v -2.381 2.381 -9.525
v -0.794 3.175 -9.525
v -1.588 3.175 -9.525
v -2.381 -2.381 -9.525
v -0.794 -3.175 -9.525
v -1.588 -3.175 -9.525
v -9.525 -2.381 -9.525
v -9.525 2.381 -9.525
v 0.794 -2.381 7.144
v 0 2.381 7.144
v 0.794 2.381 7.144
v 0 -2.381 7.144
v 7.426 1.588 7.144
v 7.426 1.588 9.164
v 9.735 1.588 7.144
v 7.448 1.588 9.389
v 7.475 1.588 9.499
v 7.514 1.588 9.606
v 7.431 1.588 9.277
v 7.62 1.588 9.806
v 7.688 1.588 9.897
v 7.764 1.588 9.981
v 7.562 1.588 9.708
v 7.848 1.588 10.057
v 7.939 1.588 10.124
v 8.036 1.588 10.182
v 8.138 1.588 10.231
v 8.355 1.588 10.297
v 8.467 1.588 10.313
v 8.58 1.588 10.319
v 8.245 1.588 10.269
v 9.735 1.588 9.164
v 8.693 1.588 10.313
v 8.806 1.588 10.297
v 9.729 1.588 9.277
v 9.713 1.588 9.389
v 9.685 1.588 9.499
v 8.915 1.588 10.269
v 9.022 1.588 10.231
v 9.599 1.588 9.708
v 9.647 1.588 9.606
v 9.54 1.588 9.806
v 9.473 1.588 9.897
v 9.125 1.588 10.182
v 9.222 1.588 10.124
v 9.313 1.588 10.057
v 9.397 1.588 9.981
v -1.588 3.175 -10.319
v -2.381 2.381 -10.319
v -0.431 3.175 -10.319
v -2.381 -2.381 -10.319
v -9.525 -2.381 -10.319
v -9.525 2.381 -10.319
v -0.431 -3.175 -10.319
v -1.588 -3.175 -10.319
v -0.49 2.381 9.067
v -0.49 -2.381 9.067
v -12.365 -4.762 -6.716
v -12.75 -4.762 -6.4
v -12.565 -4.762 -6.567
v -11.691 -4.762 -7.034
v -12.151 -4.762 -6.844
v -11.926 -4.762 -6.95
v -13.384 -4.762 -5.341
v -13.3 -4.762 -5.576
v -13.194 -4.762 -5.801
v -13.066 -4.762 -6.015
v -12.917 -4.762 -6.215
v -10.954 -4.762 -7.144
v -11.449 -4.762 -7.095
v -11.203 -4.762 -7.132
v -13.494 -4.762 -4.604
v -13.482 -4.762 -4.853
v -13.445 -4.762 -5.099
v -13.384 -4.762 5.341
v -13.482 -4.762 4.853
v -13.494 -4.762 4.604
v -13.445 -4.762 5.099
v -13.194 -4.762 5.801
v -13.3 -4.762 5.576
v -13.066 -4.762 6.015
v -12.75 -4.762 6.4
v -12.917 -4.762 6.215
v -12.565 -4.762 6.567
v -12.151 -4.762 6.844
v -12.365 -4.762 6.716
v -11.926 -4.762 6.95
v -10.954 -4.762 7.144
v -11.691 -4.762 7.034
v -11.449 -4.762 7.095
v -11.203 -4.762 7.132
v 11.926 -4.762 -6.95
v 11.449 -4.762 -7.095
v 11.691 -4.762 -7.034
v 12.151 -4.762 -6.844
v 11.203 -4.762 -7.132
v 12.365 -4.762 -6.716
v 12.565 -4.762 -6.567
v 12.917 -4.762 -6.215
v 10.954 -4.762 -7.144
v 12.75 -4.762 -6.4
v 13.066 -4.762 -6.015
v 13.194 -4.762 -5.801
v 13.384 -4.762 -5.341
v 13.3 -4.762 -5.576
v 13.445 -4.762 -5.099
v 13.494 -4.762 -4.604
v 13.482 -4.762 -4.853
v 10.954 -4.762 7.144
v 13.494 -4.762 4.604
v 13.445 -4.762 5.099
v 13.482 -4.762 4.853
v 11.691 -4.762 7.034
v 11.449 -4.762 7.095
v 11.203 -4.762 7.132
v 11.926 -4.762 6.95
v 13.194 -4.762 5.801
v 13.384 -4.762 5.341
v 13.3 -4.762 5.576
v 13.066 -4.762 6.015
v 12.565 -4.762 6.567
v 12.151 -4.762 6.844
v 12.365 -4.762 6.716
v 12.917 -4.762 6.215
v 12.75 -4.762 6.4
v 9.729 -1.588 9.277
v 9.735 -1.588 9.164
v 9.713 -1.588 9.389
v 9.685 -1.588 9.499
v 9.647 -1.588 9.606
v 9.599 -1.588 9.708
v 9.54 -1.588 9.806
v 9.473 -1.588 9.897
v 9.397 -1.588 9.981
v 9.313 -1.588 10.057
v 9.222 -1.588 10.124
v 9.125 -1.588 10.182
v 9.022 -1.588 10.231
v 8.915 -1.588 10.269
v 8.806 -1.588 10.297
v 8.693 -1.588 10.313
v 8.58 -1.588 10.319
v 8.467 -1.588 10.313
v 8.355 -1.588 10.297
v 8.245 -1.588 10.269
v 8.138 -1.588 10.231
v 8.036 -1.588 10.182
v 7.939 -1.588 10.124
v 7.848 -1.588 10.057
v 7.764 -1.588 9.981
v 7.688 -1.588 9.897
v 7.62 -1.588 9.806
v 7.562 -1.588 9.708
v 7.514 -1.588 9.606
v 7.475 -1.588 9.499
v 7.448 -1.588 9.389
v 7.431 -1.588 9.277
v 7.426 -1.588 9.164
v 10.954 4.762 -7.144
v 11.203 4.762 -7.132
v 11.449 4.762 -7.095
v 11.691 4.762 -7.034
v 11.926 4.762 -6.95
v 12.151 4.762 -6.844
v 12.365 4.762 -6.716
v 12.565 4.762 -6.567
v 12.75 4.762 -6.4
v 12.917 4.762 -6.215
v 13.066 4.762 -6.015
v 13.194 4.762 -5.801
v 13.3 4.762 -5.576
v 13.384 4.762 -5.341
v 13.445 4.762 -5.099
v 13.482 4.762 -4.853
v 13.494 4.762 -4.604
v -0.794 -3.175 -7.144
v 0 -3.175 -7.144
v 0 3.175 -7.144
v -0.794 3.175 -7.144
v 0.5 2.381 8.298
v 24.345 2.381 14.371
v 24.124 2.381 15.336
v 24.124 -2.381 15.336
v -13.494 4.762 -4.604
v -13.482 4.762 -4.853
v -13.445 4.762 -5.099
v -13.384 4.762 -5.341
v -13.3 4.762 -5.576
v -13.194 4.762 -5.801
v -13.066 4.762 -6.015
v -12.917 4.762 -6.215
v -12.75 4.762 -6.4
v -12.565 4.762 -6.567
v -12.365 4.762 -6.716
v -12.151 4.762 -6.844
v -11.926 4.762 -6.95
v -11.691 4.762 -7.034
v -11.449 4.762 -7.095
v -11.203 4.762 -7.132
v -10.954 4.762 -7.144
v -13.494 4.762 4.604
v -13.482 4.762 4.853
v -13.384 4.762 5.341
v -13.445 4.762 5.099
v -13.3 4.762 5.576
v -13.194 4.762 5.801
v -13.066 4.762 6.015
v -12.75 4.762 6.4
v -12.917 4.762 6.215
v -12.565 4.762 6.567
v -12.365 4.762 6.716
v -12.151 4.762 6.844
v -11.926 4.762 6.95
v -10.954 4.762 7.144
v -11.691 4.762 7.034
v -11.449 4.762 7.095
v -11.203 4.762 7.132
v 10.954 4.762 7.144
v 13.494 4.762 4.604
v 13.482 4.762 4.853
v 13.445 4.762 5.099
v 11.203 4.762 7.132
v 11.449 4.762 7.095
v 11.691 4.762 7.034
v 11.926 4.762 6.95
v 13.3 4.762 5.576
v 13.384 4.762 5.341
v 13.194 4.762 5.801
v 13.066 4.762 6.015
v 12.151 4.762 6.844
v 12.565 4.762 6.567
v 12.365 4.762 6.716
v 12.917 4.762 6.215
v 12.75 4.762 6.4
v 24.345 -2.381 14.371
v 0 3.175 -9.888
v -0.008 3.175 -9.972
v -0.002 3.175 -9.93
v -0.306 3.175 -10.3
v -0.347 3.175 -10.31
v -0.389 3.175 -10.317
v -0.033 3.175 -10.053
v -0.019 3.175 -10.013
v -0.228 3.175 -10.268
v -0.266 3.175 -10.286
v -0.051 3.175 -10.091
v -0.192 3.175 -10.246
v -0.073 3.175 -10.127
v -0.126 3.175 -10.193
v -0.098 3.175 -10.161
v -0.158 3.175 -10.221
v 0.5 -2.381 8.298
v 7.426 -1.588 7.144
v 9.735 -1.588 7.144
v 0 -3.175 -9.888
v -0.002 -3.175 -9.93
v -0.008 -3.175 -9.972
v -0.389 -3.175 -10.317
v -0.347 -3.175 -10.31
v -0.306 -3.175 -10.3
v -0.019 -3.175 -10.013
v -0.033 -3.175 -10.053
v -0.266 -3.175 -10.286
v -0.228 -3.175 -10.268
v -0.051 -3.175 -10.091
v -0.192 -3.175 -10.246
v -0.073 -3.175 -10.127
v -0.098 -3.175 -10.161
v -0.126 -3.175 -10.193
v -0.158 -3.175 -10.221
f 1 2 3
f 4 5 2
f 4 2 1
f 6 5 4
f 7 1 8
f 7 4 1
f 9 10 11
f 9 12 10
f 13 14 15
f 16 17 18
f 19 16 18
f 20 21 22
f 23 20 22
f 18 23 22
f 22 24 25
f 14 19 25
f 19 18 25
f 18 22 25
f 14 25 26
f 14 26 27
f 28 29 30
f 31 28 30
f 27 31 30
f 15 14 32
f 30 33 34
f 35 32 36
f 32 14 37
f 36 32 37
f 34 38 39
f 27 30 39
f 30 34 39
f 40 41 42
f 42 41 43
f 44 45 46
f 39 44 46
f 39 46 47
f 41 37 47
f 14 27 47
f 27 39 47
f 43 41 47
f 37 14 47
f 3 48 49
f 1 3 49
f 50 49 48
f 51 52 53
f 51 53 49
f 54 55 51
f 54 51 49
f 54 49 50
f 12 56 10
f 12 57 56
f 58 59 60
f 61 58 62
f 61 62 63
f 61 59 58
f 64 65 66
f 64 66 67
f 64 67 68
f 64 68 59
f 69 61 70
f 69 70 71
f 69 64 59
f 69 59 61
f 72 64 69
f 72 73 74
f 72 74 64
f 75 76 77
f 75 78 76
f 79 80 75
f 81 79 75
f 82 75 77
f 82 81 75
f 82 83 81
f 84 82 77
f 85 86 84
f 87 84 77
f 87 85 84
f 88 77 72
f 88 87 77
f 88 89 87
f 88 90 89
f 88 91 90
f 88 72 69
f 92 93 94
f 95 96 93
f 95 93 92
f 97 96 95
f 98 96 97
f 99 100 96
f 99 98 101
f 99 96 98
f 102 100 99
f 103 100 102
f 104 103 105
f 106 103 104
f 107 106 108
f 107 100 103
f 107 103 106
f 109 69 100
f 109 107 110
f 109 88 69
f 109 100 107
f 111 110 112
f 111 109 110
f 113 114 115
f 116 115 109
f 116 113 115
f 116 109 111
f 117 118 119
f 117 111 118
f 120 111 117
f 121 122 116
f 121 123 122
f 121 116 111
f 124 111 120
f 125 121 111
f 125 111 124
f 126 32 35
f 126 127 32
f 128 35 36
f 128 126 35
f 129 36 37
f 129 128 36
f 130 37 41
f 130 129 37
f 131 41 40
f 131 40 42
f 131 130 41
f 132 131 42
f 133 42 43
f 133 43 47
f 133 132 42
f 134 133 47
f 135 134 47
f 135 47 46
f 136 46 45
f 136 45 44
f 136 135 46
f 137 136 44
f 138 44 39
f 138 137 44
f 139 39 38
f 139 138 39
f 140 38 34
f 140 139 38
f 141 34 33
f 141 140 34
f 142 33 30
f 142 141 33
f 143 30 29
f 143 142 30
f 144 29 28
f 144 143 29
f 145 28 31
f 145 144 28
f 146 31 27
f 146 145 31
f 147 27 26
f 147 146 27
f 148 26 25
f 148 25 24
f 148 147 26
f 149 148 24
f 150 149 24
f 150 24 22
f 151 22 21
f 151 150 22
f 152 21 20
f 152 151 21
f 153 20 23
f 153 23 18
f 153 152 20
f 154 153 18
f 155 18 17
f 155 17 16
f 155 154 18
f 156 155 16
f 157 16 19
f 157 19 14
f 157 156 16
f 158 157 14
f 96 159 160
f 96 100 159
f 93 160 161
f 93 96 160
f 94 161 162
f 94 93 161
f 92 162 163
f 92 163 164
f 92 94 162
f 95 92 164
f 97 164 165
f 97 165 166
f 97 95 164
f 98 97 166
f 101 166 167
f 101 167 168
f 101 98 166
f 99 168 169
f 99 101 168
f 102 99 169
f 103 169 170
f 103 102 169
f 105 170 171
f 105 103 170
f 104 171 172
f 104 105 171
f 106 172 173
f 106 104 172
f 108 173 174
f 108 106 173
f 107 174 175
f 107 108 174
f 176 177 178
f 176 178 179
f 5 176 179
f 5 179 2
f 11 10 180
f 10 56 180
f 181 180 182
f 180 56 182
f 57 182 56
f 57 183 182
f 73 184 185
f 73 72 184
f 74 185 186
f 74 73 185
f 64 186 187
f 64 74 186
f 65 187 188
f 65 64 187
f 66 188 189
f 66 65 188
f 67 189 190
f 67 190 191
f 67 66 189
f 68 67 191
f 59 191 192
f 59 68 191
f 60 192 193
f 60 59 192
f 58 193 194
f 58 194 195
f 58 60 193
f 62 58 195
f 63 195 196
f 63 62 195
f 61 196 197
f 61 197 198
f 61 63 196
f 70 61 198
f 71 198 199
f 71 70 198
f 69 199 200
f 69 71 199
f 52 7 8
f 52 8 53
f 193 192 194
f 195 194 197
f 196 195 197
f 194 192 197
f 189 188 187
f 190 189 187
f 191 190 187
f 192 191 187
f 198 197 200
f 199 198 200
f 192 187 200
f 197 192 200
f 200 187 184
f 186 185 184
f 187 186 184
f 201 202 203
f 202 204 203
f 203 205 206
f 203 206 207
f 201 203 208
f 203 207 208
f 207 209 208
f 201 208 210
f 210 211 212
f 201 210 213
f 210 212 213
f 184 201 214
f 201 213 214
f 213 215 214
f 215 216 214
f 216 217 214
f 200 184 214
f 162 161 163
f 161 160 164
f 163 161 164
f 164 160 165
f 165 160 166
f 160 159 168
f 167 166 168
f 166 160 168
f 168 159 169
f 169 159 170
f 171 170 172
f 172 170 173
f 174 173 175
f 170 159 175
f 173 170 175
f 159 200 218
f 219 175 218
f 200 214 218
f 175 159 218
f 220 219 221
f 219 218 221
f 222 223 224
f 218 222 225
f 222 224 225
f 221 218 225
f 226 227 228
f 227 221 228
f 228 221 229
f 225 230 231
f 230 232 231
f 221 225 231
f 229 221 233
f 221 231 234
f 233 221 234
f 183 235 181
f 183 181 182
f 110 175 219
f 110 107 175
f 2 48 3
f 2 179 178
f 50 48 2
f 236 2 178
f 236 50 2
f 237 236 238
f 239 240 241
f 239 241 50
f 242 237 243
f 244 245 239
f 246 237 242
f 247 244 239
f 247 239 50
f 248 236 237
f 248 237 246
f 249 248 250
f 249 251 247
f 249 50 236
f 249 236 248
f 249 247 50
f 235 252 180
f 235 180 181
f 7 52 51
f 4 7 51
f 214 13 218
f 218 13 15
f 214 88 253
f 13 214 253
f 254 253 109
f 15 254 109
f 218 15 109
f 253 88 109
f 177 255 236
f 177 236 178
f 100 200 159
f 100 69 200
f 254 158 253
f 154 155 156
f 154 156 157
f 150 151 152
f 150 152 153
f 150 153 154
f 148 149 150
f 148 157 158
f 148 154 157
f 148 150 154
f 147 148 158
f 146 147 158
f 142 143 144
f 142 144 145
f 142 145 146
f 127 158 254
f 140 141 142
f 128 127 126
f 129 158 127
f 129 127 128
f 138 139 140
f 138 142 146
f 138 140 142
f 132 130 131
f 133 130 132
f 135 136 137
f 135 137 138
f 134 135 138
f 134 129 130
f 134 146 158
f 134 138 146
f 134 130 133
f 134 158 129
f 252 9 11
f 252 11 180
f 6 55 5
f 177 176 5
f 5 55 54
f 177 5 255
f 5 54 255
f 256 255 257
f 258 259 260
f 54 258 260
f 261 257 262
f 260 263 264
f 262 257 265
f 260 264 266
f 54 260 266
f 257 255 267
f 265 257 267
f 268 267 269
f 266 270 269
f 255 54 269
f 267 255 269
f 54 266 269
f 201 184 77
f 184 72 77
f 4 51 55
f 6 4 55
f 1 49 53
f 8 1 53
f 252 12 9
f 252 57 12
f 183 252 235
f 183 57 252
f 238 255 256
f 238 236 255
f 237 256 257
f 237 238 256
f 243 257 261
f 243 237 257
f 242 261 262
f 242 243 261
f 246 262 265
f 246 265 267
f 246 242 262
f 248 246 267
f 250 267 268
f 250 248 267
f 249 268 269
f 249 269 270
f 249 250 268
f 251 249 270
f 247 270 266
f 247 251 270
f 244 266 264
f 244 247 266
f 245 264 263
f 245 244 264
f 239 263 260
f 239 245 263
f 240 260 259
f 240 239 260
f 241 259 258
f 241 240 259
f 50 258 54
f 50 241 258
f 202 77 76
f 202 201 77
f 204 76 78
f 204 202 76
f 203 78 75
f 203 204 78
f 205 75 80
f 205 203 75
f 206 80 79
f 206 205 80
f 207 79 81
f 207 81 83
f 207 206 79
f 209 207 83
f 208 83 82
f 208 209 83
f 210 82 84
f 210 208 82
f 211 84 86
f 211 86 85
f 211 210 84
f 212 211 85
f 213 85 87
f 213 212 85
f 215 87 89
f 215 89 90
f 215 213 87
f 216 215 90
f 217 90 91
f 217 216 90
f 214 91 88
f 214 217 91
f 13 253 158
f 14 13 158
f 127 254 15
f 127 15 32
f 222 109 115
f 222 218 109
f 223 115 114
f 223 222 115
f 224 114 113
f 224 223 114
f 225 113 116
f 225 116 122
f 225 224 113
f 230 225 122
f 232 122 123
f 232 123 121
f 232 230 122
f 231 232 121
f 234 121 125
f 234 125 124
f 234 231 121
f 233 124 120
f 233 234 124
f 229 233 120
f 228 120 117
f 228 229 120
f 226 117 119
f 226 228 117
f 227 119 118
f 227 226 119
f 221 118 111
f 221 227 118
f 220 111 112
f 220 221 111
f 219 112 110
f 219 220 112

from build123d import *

# Parameters (mm, degrees)
F0_W      = 26.9875
F0_H      = 14.2875
F1_DEPTH  = 4.7625
F2_W      = 2.3090906763
F2_H      = 2.0204546619
F3_DEPTH  = 1.5875
F4_R      = 2.54
F7_DEPTH  = 9.525
F8_DEPTH  = 2.38125
F9_W      = 1.5875
F9_H      = 1.5875
F10_DEPTH = 25.6556836154
F11_R     = 0.4310336894


with BuildPart() as f1:
    # F0 (on Front) → F1 (new body, symmetric)
    with BuildSketch(Plane.XZ):
        Rectangle(F0_W, F0_H)
    extrude(amount=F1_DEPTH, both=True)

    # F2 (on Front) → F3 (join, symmetric)
    with BuildSketch(Plane.XZ):
        with Locations((8.5802881513, 8.1539773309)):
            Rectangle(F2_W, F2_H)
        with BuildLine():
            ThreePointArc((9.7348334894, 9.1642046619), (8.5802881513, 10.31875), (7.4257428132, 9.1642046619))
            Line((7.4257428132, 9.1642046619), (9.7348334894, 9.1642046619))
        make_face()
    extrude(amount=F3_DEPTH, both=True)

    # F4
    f4_edges = [f1.edges().sort_by_distance(p)[0] for p in [
        (13.49375, 0, 7.14375),
        (-13.49375, 0, 7.14375),
        (13.49375, 0, -7.14375),
        (-13.49375, 0, -7.14375),
    ]]
    fillet(f4_edges, radius=F4_R)


with BuildPart() as f7:
    # F6 (on face) → F7 (new body)
    with BuildSketch(Plane.XZ.offset(4.7625)):
        Polygon((0, -7.14375), (-0.79375, -7.14375), (-0.79375, -9.525), (-9.525, -9.525), (-9.525, -10.31875), (0, -10.31875), align=None)
    extrude(amount=-F7_DEPTH)

    # F9 (on face) → F10 (cut, through all)
    with BuildSketch(Plane(origin=(0, 0, -10.31875), x_dir=(1, 0, 0), z_dir=(0, 0, -1))):
        with Locations((-0.79375, 3.96875)):
            Rectangle(F9_W, F9_H)
        Polygon((-1.5875, 3.175), (-1.5875, 4.7625), (-9.525, 4.7625), (-9.525, 2.38125), (-2.38125, 2.38125), align=None)
        Polygon((-2.38125, -2.38125), (-9.525, -2.38125), (-9.525, -4.7625), (-1.5875, -4.7625), (-1.5875, -3.175), align=None)
        with Locations((-0.79375, -3.96875)):
            Rectangle(F9_W, F9_H)
    extrude(amount=-F10_DEPTH, mode=Mode.SUBTRACT)

    # F11
    f11_edges = [f7.edges().sort_by_distance(p)[0] for p in [
        (0, 0, -10.31875),
    ]]
    fillet(f11_edges, radius=F11_R)


with BuildPart() as f8:
    # F5 (on Front) → F8 (new body, symmetric)
    with BuildSketch(Plane.XZ):
        Polygon((0, 7.14375), (0.79375, 7.14375), (0.4998811565, 8.2975389727), (24.3448532584, 14.3708284046), (24.1243833445, 15.3359336154), (-0.4897814058, 9.0667316211), align=None)
    extrude(amount=F8_DEPTH, both=True)


solid = Compound([f1.part, f7.part, f8.part])
